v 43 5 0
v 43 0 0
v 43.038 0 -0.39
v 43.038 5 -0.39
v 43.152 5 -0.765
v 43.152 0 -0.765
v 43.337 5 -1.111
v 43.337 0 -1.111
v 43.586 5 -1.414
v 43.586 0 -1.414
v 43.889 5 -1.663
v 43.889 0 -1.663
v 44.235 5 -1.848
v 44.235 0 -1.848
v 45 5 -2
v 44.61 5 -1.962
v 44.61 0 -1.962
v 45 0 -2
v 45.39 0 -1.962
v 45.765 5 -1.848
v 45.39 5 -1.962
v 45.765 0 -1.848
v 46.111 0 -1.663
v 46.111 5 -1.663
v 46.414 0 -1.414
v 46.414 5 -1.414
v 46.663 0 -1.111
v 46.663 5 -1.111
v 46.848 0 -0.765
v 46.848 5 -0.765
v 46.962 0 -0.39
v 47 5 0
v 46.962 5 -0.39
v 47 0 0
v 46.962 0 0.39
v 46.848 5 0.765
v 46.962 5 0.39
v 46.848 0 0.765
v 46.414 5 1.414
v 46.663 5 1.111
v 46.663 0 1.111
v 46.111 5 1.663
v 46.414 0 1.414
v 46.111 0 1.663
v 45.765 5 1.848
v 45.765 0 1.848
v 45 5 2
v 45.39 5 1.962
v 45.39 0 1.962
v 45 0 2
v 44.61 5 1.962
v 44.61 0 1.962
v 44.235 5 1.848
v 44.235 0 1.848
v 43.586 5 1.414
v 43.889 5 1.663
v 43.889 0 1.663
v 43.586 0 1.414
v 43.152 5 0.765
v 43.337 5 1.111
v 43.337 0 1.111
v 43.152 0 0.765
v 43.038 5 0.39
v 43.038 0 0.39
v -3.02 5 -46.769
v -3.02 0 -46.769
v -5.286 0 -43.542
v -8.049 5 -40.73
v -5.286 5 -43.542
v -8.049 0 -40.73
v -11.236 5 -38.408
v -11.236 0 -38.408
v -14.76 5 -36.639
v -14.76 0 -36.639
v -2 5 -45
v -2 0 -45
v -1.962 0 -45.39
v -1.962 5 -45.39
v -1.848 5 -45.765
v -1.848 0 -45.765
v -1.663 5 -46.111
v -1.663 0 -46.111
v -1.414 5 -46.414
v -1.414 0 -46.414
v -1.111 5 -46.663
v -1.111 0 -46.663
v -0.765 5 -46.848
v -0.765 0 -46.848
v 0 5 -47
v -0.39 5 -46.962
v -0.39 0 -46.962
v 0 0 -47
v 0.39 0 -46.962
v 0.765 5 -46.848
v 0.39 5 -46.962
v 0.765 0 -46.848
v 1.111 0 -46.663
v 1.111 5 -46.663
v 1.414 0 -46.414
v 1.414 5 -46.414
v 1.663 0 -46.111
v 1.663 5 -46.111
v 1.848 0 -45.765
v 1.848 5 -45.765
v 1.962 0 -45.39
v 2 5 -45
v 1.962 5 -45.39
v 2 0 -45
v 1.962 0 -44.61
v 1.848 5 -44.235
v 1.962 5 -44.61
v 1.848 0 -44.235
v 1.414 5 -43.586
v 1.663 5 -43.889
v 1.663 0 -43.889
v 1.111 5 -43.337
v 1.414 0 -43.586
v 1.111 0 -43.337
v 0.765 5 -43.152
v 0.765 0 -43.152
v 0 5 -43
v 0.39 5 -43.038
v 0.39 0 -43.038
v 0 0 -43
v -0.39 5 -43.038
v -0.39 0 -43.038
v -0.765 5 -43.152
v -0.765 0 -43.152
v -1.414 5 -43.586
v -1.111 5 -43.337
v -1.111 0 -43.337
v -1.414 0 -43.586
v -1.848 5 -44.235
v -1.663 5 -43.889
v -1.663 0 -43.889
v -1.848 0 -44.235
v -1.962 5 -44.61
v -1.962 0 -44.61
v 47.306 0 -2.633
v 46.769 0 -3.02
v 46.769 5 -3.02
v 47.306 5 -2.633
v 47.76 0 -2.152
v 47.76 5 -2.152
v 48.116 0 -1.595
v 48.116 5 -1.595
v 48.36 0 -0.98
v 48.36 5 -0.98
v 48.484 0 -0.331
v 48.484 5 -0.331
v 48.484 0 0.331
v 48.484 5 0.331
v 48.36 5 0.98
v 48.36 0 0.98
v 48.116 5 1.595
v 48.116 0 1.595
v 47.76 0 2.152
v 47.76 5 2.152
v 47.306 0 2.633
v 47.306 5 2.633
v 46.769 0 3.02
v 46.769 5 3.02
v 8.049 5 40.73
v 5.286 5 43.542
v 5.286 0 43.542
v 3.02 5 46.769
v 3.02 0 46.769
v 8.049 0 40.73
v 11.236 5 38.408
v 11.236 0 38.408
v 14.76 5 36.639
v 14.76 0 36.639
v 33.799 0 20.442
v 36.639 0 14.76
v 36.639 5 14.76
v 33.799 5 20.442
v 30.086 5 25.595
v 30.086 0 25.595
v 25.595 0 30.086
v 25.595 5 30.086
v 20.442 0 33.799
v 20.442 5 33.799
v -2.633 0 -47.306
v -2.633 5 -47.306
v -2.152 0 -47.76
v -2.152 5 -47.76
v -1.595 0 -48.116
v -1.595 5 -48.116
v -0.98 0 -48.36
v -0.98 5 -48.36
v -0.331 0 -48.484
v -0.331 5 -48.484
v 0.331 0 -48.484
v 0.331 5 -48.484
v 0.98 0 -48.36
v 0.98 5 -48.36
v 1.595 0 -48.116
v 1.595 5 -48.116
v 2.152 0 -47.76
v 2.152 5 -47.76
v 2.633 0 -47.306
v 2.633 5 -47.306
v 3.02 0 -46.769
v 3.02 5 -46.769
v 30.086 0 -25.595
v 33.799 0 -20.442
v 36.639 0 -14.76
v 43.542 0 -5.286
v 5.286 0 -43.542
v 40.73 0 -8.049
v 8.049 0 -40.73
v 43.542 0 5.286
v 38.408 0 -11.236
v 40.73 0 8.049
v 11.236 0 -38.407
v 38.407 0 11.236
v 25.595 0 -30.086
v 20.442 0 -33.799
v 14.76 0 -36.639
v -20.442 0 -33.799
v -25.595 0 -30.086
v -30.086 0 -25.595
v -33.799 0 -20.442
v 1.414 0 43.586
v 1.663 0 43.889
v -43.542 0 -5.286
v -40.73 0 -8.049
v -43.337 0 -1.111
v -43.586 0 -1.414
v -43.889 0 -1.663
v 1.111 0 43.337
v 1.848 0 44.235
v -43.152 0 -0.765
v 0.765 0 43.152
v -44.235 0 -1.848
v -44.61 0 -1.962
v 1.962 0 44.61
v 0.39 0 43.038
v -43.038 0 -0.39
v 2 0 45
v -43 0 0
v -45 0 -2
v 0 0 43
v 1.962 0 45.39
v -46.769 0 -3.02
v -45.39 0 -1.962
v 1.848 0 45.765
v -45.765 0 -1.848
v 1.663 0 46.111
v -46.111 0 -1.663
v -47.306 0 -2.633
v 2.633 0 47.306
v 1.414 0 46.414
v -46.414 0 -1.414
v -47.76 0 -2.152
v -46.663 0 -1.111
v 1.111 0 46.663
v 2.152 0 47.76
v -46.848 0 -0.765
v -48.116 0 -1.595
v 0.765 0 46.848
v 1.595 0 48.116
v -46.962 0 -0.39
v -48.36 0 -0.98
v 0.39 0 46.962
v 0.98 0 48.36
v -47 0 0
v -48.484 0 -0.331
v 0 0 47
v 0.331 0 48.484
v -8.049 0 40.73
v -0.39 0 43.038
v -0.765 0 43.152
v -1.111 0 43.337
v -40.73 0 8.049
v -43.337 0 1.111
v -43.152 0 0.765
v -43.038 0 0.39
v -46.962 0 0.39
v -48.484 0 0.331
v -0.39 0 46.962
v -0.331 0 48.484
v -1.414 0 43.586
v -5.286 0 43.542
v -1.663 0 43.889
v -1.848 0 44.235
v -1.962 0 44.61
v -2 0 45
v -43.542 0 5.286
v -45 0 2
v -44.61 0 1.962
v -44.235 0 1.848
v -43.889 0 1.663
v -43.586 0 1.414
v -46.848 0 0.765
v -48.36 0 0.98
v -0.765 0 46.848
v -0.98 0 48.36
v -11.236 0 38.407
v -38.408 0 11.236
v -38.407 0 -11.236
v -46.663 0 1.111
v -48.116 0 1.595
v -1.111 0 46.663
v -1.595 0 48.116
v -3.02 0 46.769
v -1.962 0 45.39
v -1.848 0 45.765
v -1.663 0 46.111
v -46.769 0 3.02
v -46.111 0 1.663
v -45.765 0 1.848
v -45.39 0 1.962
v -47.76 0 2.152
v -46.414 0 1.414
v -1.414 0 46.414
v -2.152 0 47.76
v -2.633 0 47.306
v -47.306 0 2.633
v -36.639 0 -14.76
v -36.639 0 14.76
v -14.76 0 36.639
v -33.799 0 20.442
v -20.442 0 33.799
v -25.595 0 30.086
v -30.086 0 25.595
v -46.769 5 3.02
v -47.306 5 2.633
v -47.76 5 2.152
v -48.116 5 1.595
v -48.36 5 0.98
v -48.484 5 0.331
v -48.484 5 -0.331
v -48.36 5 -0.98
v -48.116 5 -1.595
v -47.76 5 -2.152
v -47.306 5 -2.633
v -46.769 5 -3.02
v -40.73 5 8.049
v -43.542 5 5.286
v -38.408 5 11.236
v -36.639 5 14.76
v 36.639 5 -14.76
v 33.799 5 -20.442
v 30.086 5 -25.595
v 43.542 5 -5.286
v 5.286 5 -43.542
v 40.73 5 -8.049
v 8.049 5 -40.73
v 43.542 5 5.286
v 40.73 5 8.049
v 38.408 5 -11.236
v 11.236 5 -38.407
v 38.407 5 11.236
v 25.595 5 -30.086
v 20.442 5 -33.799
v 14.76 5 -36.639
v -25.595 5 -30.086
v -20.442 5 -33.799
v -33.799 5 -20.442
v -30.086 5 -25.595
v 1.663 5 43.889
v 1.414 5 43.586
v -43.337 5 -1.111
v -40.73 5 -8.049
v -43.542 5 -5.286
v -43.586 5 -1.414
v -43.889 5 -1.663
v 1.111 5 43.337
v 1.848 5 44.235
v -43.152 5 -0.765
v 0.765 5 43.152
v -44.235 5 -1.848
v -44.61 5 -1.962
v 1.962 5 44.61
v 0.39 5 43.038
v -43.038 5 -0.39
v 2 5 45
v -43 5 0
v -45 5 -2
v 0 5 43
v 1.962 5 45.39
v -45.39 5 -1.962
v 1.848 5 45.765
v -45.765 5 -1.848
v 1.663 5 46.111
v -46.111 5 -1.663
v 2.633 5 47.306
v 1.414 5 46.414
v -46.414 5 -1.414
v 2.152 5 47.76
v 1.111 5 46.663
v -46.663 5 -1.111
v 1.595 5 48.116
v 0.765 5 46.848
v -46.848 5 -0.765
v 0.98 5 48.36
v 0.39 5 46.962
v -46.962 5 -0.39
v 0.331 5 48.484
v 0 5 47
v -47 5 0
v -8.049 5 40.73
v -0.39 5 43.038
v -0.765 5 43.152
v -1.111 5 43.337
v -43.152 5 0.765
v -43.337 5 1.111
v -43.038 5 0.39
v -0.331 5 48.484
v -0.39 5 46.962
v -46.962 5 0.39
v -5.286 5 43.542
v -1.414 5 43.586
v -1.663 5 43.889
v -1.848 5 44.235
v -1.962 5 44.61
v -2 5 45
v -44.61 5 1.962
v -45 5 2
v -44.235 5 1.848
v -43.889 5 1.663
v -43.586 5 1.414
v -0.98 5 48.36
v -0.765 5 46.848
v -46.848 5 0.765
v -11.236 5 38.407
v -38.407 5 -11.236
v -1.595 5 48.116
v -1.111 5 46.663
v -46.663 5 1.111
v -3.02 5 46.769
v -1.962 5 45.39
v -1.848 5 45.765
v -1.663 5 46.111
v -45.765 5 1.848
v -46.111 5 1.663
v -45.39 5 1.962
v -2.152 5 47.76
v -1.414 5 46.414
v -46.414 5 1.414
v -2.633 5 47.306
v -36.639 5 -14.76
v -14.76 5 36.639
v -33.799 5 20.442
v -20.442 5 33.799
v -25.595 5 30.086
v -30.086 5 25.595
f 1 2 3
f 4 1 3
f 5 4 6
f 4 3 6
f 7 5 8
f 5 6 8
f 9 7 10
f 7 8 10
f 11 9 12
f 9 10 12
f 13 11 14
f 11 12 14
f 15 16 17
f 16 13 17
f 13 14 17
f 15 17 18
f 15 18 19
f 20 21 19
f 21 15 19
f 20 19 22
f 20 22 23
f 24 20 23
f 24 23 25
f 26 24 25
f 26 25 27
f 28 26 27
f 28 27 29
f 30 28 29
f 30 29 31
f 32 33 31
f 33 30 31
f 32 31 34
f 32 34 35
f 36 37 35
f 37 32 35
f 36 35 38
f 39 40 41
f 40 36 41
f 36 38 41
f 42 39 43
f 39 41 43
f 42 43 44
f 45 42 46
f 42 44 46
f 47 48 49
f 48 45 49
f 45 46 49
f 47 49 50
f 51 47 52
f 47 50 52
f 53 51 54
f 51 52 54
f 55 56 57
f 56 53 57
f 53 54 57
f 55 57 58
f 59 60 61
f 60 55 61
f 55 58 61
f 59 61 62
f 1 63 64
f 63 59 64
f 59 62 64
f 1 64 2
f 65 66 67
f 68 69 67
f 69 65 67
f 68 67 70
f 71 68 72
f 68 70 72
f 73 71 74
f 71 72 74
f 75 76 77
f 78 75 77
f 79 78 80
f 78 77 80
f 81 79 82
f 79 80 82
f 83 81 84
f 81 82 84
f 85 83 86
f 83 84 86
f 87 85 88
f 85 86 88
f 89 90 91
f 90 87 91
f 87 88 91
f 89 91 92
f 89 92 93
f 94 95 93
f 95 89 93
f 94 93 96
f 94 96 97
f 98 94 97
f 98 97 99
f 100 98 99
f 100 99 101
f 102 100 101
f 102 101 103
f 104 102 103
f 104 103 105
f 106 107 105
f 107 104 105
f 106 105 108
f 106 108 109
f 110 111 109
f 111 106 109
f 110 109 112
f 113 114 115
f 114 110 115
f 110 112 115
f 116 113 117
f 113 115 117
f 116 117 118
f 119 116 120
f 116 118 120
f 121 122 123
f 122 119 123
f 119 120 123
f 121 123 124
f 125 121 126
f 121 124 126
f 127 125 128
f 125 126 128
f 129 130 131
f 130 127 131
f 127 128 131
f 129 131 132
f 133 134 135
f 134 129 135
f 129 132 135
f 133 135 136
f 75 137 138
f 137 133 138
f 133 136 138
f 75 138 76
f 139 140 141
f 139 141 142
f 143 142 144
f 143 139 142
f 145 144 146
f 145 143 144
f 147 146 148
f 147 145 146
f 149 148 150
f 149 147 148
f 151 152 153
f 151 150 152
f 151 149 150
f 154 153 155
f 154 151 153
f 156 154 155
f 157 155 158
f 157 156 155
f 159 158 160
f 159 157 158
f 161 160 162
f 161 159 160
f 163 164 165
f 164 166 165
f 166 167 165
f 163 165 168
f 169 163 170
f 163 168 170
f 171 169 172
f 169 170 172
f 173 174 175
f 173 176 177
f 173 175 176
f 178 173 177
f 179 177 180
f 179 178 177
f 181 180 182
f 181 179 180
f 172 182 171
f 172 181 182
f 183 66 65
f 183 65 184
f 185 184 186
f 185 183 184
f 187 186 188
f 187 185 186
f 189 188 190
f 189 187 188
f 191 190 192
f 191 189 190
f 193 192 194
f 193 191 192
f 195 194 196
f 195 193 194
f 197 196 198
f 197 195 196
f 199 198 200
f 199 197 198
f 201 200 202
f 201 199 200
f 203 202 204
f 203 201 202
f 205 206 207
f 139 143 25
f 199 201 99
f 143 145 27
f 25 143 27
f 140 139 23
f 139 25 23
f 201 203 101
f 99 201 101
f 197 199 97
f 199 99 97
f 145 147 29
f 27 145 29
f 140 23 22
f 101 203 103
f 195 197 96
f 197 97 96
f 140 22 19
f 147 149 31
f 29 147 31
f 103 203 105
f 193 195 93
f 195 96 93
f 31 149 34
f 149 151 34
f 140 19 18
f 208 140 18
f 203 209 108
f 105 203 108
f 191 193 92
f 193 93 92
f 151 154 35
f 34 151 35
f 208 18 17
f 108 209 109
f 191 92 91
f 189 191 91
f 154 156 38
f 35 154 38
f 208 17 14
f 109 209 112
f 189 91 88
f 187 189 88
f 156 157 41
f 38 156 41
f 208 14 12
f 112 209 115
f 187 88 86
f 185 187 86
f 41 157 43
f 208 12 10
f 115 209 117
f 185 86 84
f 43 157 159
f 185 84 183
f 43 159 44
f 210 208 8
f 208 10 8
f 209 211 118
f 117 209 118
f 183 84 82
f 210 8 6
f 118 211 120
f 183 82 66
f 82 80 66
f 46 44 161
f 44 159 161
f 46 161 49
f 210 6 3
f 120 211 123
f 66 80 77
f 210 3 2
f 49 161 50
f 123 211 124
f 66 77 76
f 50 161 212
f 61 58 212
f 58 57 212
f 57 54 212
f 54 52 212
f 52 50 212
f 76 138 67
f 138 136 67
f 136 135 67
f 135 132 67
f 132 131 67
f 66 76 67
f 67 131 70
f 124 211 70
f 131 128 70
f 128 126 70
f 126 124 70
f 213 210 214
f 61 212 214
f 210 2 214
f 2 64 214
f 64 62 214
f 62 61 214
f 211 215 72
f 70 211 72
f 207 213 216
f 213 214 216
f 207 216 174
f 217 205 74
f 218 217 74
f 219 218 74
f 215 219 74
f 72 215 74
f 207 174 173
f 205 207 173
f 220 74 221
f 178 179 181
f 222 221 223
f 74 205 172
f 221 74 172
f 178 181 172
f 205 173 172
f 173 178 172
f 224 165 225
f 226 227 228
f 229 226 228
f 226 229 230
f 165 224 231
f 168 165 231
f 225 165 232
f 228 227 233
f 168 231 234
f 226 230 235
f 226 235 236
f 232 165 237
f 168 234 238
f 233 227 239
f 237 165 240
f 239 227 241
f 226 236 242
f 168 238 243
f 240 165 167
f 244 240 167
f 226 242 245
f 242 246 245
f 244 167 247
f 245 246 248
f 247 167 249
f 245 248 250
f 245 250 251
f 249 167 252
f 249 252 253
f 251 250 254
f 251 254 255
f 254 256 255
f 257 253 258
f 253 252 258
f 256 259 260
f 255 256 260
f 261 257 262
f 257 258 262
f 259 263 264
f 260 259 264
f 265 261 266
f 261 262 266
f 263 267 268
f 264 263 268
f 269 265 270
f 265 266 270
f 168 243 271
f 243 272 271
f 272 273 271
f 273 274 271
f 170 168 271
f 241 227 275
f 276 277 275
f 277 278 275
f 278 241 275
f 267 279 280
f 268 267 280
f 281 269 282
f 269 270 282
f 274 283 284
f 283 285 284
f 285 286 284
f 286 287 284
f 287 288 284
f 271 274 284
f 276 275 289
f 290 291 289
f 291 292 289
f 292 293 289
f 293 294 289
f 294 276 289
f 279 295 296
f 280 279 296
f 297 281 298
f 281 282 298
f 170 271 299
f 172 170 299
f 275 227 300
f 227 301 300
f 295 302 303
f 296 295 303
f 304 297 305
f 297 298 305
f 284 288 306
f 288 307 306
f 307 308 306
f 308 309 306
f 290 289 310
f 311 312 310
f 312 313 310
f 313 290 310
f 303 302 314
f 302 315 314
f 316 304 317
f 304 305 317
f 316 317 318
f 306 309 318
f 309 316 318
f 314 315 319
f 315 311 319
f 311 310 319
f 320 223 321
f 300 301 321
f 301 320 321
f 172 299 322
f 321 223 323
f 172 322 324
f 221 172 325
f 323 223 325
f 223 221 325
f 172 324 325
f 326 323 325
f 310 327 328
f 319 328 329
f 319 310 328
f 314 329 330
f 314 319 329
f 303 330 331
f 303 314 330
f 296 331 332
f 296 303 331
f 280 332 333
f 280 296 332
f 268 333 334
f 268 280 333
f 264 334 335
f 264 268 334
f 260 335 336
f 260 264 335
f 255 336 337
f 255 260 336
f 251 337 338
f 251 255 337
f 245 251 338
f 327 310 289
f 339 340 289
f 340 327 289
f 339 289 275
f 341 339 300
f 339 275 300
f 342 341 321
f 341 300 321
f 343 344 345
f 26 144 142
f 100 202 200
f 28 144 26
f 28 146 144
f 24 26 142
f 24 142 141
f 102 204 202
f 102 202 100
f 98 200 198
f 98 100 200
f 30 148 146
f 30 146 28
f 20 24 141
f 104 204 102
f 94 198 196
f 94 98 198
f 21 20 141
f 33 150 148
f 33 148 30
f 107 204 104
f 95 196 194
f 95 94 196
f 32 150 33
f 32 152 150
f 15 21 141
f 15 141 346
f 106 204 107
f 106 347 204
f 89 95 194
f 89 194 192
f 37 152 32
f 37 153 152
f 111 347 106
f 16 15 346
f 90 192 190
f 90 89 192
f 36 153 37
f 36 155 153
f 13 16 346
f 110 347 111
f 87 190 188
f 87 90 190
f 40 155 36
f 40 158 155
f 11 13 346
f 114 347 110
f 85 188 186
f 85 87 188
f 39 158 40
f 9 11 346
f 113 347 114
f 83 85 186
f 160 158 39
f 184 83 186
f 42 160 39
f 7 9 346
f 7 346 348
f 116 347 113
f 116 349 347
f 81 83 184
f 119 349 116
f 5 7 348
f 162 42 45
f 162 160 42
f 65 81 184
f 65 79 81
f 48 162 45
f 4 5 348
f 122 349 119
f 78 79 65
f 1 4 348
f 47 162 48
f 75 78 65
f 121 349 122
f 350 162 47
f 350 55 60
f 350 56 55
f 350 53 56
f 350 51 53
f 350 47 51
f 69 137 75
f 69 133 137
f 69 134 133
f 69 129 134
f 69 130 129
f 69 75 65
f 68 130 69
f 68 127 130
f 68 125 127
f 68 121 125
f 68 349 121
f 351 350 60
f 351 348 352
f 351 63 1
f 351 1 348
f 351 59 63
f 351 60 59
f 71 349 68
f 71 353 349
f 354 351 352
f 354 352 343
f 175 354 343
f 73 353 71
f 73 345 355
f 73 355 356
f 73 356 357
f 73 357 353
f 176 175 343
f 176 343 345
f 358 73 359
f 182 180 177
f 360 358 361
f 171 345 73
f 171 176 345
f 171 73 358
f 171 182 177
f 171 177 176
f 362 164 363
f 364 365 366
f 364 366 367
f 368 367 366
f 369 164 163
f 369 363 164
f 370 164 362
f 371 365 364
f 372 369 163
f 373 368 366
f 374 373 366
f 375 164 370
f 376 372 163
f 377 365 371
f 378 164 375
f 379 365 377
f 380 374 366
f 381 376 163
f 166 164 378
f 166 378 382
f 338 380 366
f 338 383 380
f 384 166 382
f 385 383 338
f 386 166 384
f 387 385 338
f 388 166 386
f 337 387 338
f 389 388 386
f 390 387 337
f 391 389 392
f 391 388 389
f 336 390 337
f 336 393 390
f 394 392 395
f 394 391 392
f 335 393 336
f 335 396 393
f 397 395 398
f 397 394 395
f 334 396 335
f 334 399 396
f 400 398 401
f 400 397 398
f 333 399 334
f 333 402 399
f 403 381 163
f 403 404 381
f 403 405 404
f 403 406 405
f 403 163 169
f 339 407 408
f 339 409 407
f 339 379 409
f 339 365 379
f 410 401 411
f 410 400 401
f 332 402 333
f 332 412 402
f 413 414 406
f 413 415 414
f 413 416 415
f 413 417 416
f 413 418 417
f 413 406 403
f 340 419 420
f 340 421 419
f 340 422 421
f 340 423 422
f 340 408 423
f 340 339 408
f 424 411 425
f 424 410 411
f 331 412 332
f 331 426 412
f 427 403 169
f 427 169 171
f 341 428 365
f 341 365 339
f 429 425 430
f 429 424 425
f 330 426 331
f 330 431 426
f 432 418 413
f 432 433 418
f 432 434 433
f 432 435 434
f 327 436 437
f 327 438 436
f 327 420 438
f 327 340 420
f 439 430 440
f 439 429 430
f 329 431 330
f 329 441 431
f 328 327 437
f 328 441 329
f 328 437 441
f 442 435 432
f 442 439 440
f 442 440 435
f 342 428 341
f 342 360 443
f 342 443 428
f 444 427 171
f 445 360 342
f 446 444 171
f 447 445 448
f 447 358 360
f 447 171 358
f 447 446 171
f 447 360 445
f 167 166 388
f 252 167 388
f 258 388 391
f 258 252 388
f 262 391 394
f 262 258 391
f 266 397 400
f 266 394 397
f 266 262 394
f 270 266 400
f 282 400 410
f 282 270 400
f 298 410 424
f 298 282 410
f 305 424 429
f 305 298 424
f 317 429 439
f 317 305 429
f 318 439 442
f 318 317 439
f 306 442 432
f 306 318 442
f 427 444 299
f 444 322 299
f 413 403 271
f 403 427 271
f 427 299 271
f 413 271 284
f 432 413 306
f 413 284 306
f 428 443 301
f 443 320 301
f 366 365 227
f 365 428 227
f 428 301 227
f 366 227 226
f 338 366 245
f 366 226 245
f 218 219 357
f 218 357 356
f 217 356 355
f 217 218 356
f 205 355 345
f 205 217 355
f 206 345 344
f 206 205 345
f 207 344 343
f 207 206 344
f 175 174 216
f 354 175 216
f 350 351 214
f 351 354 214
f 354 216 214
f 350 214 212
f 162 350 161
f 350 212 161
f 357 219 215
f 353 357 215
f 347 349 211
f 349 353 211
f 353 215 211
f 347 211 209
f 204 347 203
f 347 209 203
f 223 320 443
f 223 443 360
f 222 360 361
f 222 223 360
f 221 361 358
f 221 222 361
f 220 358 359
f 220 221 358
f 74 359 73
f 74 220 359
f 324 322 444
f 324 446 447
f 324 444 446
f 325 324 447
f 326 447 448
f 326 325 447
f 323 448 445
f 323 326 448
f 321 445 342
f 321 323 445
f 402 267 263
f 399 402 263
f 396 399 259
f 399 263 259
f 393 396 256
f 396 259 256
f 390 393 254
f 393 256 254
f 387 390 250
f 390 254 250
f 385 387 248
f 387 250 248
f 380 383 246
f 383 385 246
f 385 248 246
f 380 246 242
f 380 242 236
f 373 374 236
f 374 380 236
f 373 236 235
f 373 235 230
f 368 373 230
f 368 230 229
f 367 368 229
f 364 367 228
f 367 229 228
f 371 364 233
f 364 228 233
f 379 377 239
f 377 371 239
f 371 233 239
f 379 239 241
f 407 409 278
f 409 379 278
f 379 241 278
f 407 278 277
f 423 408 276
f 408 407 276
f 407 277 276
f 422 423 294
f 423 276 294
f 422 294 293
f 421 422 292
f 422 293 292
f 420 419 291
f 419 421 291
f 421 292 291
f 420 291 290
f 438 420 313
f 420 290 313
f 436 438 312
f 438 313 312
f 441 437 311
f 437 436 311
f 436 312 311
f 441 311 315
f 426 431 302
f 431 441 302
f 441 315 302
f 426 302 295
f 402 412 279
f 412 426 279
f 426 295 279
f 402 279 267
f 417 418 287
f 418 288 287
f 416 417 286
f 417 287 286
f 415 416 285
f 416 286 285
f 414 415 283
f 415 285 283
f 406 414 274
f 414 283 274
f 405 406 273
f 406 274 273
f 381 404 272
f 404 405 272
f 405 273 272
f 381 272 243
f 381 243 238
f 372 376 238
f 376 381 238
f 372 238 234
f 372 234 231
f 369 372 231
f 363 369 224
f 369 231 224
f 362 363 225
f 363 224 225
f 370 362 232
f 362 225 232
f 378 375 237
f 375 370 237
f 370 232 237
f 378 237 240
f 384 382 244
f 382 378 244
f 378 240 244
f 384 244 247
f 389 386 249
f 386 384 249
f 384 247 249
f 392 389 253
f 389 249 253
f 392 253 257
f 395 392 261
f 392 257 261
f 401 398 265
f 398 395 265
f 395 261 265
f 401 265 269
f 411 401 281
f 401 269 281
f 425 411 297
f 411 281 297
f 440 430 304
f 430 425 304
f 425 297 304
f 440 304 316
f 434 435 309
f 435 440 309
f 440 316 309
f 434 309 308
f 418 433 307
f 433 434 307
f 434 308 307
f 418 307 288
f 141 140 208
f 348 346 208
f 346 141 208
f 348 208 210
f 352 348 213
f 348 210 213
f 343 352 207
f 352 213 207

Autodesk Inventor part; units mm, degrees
ref_plane "YZ Plane" through (0, 0, 0) normal (1, 0, 0) x (0, 1, 0)
ref_plane "XZ Plane" through (0, 0, 0) normal (0, 1, 0) x (-1, 0, 0)
ref_plane "XY Plane" through (0, 0, 0) normal (0, 0, 1) x (1, 0, 0)
sketch "Sketch1" plane through (0, 0, 0) normal (0, 1, 0) x (-1, 0, 0)
  circle A0 centre (0, 0) radius 39.5
  circle A1 centre (0, 0) radius 36.5
  circle A2 centre (0, 45) radius 3.5
  circle A3 centre (0, 45) radius 2
  arc A4 (3.02, 46.7691) -> (14.7602, 36.6386) centre (23.7285, 58.9) ccw
  arc A5 (-14.7602, 36.6386) -> (-3.02, 46.7691) centre (-23.7285, 58.9) ccw
  arc A6 (-46.7691, 3.02) -> (-36.6386, 14.7602) centre (-58.9, 23.7285) ccw
  circle A7 centre (-45, 0) radius 3.5
  circle A8 centre (-45, 0) radius 2
  arc A9 (-36.6386, -14.7602) -> (-46.7691, -3.02) centre (-58.9, -23.7285) ccw
  arc A10 (-3.02, -46.7691) -> (-14.7602, -36.6386) centre (-23.7285, -58.9) ccw
  circle A11 centre (0, -45) radius 3.5
  circle A12 centre (0, -45) radius 2
  arc A13 (14.7602, -36.6386) -> (3.02, -46.7691) centre (23.7285, -58.9) ccw
  arc A14 (46.7691, -3.02) -> (36.6386, -14.7602) centre (58.9, -23.7285) ccw
  circle A15 centre (45, 0) radius 3.5
  circle A16 centre (45, 0) radius 2
  arc A17 (36.6386, 14.7602) -> (46.7691, 3.02) centre (58.9, 23.7285) ccw
  point P0 (36.6386, 14.7602)
  point P1 (-36.6386, 14.7602)
  point P2 (-36.6386, -14.7602)
  point P3 (-14.7602, -36.6386)
  point P4 (14.7602, -36.6386)
  point P5 (36.6386, -14.7602)
  dimension "d0" = 79
  dimension "d1" = 73
  dimension "d2" = 7
  dimension "d3" = 4
  dimension "d8" = 360
  dimension "d12" = 45
  dimension "d13" = 24
extrude "Extrusion1" add sketch "Sketch1" along normal blind 5 contours A0 | A0 A17 A15 A14 | A0 A5 A2 A4 | A15 | A13 A11 A10 A0 | A2 | A11 | A0 A9 A7 A6 | A7 | A1
properties part number "tapa"
